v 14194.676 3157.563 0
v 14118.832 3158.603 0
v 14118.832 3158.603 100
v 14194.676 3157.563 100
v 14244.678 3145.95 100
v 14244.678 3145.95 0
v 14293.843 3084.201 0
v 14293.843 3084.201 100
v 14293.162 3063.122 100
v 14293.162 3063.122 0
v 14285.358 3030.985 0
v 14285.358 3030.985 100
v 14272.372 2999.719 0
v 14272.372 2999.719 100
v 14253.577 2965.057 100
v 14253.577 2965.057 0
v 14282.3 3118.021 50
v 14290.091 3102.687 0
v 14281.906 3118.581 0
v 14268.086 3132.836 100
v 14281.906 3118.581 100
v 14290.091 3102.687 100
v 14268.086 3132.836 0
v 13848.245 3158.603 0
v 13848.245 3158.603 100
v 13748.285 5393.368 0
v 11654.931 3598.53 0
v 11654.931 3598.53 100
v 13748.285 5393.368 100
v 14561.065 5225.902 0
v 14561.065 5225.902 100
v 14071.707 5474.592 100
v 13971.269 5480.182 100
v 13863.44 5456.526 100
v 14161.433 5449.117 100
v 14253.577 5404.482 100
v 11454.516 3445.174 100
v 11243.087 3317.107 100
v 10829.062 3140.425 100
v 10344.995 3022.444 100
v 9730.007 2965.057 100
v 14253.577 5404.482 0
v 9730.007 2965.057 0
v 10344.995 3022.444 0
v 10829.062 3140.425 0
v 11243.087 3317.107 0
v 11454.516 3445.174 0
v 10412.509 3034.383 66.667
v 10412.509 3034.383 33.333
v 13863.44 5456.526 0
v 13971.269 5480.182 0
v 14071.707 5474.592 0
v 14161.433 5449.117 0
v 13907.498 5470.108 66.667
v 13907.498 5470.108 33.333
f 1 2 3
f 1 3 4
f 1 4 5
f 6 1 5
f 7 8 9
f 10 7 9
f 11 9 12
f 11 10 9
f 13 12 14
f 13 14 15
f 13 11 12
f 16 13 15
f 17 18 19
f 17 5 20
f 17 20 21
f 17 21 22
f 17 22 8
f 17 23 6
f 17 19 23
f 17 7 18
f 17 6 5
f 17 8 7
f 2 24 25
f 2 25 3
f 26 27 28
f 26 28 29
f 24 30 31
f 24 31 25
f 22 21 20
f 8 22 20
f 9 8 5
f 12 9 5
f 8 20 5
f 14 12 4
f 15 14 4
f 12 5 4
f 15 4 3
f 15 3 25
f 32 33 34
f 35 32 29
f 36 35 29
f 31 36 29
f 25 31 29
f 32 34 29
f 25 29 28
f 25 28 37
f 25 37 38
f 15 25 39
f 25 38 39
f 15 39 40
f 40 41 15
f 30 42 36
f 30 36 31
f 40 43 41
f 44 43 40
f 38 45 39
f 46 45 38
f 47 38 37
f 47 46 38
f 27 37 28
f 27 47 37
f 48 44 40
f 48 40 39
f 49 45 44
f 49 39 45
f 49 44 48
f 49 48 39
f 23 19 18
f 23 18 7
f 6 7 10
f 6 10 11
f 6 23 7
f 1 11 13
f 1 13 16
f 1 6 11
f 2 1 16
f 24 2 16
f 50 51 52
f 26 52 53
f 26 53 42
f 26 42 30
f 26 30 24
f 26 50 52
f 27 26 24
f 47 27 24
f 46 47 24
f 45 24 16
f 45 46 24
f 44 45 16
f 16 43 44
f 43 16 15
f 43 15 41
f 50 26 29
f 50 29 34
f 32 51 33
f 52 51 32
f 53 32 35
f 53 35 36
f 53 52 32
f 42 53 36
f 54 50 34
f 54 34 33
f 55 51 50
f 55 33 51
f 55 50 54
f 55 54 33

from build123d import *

# Parameters (mm, degrees)
BOSS_EXTRU_1_DEPTH = 100


with BuildPart() as part:
    # Esquisse1 → Boss.-Extru.1 (new body)
    with BuildSketch(Plane.XY):
        with BuildLine():
            Line((11654.93053423, 3598.529635923), (13748.284665994, 5393.367974263))
            add(Edge.make_bspline(
                [(13748.284665994, 5393.367974263), (13902.888830204, 5506.626297242), (14071.319622415, 5510.330813937), (14253.577042626, 5404.481524346)],
                knots=[0, 0, 0, 0, 1, 1, 1, 1], degree=3))
            Line((14253.577042626, 5404.481524346), (14561.065024047, 5225.902323822))
            Line((14561.065024047, 5225.902323822), (13848.245448642, 3158.60324779))
            Line((13848.245448642, 3158.60324779), (14118.832408858, 3158.60324779))
            add(Edge.make_bspline(
                [(14118.832408858, 3158.60324779), (14378.395991656, 3174.211265678), (14253.577042626, 2965.057281214)],
                knots=[0, 0, 0, 1, 1, 1], degree=2))
            Line((14253.577042626, 2965.057281214), (9730.007194676, 2965.057281214))
            add(Edge.make_bspline(
                [(9730.007194676, 2965.057281214), (10415.441098181, 2985.308122708), (11109.57533367, 3130.942997271), (11654.93053423, 3598.529635923)],
                knots=[0, 0, 0, 0, 1, 1, 1, 1], degree=3))
        make_face()
    extrude(amount=BOSS_EXTRU_1_DEPTH)


solid = part.part
